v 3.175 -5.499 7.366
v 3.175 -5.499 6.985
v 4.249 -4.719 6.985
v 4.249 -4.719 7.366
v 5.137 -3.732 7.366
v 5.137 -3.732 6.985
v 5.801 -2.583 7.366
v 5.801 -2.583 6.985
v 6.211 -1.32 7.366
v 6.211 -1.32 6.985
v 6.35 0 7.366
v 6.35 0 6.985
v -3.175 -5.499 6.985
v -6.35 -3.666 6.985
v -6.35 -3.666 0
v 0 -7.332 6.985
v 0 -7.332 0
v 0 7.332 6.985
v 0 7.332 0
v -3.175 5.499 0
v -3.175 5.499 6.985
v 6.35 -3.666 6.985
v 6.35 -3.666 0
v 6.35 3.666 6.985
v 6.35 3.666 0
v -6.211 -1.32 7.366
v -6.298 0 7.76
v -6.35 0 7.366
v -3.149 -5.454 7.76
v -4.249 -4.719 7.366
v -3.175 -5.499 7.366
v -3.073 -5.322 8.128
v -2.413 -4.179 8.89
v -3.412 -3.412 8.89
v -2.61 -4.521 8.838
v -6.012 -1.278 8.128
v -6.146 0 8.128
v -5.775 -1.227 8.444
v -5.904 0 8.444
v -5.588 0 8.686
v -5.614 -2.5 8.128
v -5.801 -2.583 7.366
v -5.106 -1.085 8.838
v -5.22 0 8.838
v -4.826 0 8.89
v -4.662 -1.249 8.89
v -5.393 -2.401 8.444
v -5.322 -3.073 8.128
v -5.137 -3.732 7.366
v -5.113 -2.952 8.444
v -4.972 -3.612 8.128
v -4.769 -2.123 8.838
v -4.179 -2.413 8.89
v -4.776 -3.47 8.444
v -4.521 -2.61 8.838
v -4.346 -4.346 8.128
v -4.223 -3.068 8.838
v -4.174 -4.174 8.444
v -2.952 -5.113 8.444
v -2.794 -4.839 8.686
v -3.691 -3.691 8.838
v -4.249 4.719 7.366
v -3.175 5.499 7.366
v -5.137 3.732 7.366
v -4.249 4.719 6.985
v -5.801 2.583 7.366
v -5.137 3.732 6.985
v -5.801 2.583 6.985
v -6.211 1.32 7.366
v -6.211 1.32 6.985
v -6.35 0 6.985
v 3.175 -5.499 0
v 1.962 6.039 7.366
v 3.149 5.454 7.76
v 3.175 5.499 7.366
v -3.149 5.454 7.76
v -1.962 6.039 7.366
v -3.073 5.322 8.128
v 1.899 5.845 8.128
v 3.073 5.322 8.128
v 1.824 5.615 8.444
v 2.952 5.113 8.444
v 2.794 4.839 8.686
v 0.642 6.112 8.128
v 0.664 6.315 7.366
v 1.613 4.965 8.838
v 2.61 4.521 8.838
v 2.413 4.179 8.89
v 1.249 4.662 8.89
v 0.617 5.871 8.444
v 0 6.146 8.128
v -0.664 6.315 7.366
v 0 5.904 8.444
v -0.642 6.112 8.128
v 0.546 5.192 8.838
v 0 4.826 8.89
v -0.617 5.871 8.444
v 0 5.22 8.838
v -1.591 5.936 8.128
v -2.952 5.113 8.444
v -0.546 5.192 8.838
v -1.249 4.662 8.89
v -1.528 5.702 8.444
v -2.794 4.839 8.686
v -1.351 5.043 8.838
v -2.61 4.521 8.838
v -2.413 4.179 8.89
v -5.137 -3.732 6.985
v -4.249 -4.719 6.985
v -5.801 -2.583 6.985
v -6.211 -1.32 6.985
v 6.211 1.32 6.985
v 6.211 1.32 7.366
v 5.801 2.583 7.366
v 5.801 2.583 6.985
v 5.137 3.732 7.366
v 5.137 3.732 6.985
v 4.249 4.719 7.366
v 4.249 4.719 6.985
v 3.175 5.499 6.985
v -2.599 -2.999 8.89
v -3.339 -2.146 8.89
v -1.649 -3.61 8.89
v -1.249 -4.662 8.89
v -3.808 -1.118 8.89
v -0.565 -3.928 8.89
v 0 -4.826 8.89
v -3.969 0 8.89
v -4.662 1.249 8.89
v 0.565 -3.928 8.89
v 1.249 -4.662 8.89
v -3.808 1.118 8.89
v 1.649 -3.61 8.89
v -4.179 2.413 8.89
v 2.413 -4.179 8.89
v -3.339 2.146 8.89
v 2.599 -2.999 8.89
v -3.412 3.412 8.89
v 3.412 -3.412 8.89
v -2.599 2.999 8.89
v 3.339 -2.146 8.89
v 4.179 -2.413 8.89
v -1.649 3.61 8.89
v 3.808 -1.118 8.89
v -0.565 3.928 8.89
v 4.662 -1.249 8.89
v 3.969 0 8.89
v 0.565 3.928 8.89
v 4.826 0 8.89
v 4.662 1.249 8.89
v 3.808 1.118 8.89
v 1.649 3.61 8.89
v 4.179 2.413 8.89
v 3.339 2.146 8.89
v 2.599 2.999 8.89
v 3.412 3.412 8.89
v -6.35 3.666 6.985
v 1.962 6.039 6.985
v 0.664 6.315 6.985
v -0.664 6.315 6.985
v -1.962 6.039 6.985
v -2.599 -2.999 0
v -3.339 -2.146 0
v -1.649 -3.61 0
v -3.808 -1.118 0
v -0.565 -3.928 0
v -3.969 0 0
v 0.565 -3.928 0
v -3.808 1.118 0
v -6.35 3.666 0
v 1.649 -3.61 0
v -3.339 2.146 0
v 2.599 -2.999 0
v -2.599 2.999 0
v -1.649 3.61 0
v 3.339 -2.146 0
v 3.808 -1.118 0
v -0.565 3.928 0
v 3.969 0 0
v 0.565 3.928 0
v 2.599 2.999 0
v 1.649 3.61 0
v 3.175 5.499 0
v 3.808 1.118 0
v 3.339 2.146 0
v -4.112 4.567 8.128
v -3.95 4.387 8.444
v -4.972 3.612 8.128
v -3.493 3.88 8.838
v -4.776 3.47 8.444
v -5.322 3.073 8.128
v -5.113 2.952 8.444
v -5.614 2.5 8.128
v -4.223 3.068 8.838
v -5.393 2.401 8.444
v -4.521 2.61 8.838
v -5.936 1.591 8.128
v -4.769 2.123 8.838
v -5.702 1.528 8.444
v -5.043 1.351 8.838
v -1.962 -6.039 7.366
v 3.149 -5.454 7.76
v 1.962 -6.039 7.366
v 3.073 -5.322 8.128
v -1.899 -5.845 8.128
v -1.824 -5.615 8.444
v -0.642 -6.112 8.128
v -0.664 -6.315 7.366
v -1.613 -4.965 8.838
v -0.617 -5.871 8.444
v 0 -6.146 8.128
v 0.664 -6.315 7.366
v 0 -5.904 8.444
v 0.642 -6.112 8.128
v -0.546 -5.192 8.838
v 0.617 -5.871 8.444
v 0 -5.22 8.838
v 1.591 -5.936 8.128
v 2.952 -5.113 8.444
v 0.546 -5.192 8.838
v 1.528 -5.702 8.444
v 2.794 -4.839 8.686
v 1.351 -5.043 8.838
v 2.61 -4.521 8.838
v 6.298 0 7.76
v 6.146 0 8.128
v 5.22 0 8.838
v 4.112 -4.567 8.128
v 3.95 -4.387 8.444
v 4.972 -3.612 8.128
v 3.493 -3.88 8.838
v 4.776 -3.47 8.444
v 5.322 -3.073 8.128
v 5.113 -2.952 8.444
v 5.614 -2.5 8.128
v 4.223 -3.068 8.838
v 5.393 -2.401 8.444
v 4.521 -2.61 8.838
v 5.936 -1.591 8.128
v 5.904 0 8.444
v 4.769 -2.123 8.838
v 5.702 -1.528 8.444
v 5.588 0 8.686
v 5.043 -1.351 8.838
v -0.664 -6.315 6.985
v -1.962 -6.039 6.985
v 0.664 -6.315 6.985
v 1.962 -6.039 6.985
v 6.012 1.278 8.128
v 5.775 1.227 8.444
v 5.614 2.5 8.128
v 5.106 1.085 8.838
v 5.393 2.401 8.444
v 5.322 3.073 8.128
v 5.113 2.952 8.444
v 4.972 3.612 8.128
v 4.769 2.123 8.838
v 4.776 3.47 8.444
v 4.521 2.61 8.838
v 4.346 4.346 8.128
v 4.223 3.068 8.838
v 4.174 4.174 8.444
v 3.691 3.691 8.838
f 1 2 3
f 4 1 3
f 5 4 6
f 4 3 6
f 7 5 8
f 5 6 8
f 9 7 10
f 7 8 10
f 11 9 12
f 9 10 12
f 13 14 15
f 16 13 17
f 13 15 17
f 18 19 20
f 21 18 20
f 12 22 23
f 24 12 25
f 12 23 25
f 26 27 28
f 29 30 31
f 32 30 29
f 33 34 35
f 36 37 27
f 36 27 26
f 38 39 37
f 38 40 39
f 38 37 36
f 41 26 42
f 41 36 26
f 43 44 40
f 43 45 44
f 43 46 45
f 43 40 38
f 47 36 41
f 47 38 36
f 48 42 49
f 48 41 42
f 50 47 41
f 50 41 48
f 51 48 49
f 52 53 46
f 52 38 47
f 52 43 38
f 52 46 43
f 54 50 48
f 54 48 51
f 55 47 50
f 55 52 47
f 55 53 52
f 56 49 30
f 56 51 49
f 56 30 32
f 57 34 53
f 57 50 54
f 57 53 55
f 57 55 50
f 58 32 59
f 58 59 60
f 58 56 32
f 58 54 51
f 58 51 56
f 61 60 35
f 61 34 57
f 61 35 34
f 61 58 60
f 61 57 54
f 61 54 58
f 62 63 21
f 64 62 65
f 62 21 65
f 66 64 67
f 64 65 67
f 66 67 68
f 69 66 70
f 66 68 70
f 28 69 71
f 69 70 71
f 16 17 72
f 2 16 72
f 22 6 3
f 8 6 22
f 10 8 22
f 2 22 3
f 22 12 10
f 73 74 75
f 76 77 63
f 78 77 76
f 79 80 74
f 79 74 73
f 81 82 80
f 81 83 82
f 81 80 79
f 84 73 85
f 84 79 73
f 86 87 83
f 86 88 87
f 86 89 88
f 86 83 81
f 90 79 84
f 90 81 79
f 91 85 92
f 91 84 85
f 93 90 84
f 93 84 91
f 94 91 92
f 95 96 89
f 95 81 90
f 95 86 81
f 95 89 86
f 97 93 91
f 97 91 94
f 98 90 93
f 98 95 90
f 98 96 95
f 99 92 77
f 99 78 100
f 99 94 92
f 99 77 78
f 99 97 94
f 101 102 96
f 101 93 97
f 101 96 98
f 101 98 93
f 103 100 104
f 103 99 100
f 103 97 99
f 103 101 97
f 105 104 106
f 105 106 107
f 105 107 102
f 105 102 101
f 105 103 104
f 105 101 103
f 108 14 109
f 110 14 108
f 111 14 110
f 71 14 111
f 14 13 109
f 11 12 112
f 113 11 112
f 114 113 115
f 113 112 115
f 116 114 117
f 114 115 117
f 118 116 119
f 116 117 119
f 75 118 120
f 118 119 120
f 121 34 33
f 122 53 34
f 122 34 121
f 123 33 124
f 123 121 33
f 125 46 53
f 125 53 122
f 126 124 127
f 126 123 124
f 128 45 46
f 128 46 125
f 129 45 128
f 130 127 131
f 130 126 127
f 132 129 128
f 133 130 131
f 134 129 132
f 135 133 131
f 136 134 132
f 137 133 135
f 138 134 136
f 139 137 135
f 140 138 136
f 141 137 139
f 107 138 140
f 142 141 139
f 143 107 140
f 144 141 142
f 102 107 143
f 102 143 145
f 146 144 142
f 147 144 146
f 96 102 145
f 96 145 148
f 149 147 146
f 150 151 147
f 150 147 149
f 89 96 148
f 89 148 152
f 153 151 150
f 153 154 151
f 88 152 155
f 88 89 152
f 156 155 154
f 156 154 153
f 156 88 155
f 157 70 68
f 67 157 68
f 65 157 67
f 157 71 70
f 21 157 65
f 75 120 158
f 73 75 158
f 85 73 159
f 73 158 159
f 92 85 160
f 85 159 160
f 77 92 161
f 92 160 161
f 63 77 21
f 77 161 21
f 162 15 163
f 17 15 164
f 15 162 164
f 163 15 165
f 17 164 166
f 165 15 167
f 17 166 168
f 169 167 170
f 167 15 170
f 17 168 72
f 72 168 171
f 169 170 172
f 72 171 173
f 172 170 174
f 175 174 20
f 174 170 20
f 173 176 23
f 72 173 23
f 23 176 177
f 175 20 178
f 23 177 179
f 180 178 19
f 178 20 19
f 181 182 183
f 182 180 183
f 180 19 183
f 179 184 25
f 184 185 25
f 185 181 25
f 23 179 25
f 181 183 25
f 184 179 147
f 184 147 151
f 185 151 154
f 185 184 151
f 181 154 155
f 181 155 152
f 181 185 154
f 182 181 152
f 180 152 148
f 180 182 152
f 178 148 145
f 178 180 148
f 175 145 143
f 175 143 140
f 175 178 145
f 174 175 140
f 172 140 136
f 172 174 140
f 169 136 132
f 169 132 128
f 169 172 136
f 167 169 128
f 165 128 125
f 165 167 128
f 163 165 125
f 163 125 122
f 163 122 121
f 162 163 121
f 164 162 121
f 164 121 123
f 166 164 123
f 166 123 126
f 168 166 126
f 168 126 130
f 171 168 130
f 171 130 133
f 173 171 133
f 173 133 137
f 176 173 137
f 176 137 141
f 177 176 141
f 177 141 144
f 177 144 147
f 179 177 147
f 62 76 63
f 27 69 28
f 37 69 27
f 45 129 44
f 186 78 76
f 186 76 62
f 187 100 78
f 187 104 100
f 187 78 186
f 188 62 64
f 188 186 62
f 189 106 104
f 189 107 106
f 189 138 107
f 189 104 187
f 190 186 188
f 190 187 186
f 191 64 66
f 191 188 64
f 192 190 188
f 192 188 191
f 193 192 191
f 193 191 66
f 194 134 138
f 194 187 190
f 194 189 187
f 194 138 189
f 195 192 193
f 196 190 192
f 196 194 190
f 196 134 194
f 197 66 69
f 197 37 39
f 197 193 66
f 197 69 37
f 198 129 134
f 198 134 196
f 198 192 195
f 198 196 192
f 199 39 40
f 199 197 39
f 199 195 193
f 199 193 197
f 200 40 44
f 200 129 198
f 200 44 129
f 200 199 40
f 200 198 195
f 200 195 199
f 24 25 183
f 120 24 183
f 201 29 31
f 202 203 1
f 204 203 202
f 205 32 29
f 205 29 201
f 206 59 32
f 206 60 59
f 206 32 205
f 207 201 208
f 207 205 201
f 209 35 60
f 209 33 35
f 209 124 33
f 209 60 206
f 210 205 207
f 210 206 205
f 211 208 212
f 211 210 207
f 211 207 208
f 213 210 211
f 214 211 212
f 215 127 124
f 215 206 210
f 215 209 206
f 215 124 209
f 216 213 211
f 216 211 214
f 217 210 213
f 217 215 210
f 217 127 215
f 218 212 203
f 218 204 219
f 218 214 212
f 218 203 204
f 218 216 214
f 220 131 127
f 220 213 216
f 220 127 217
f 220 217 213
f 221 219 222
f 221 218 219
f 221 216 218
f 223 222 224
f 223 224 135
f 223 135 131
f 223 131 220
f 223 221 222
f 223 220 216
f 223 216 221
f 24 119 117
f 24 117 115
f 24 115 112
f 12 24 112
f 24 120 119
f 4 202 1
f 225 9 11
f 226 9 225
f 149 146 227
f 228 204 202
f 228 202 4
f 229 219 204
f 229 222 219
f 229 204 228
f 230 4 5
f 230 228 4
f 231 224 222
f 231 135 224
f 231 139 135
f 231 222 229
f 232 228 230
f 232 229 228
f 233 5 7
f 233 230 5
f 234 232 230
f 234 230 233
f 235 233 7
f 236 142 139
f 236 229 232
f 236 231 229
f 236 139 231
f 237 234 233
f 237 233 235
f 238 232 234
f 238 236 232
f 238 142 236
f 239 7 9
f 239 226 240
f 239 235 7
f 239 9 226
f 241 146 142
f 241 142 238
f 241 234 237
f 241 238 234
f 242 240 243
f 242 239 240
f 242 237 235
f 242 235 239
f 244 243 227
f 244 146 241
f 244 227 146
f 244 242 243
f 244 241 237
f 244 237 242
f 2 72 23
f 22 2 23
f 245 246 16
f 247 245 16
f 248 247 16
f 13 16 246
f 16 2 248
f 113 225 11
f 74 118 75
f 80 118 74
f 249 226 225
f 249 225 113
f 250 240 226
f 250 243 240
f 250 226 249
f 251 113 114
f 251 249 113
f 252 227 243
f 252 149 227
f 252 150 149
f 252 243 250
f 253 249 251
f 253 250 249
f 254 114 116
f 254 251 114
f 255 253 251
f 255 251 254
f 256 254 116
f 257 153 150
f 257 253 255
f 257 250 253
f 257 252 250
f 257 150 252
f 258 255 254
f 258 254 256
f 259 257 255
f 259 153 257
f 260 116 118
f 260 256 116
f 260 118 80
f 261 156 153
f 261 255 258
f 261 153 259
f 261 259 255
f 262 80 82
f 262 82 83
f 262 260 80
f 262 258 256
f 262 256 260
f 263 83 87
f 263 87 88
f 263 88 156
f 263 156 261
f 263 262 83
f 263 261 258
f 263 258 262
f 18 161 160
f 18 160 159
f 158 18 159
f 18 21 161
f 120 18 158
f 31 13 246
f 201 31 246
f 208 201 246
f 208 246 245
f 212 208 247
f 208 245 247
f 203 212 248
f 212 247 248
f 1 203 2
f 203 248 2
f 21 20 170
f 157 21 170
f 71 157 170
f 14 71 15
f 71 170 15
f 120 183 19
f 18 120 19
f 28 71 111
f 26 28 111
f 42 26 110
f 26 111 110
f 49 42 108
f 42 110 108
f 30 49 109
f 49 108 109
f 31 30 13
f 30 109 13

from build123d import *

# Parameters (mm, degrees)
F0_R     = 3.96875
F1_DEPTH = 6.985
F2_DEPTH = 8.89
F3_R     = 1.524


with BuildPart() as f1:
    # F0 (on Top) → F1 (new body)
    with BuildSketch(Plane.XY):
        with BuildLine():
            Line((-6.35, -3.6661742094), (-3.174999936, -5.499261351))
            ThreePointArc((-3.174999936, -5.499261351), (-5.4992612955, -3.175000032), (-6.35, 0))
            Line((-6.35, 0), (-6.35, -3.6661742094))
        make_face()
        with BuildLine():
            ThreePointArc((-6.35, 0), (-5.4992613406, 3.174999954), (-3.175000092, 5.4992612609))
            Line((-3.175000092, 5.4992612609), (-6.35, 3.6661742094))
            Line((-6.35, 3.6661742094), (-6.35, 0))
        make_face()
        with BuildLine():
            ThreePointArc((-3.175000092, 5.4992612609), (-1.72e-08, 6.35), (3.1750000622, 5.4992612781))
            Line((3.1750000622, 5.4992612781), (0, 7.3323484187))
            Line((0, 7.3323484187), (-3.175000092, 5.4992612609))
        make_face()
        with BuildLine():
            ThreePointArc((3.1750000622, 5.4992612781), (5.499261332, 3.1749999689), (6.35, 0))
            Line((6.35, 0), (6.35, 3.6661742094))
            Line((6.35, 3.6661742094), (3.1750000622, 5.4992612781))
        make_face()
        with BuildLine():
            Line((6.35, -3.6661742094), (6.35, 0))
            ThreePointArc((6.35, 0), (5.4992613128, -3.1750000022), (3.1749999956, -5.4992613166))
            Line((3.1749999956, -5.4992613166), (6.35, -3.6661742094))
        make_face()
        with BuildLine():
            Line((0, -7.3323484187), (3.1749999956, -5.4992613166))
            ThreePointArc((3.1749999956, -5.4992613166), (3.44e-08, -6.35), (-3.174999936, -5.499261351))
            Line((-3.174999936, -5.499261351), (0, -7.3323484187))
        make_face()
        with BuildLine():
            ThreePointArc((3.1749999956, -5.4992613166), (5.4992613128, -3.1750000022), (6.35, 0))
            ThreePointArc((6.35, 0), (5.499261332, 3.1749999689), (3.1750000622, 5.4992612781))
            ThreePointArc((3.1750000622, 5.4992612781), (-1.72e-08, 6.35), (-3.175000092, 5.4992612609))
            ThreePointArc((-3.175000092, 5.4992612609), (-5.4992613406, 3.174999954), (-6.35, 0))
            ThreePointArc((-6.35, 0), (-5.4992612955, -3.175000032), (-3.174999936, -5.499261351))
            ThreePointArc((-3.174999936, -5.499261351), (3.44e-08, -6.35), (3.1749999956, -5.4992613166))
        make_face()
        Circle(F0_R, mode=Mode.SUBTRACT)
    extrude(amount=F1_DEPTH)

    # F0 (on Top) → F2 (join)
    with BuildSketch(Plane.XY):
        with BuildLine():
            ThreePointArc((3.1749999956, -5.4992613166), (5.4992613128, -3.1750000022), (6.35, 0))
            ThreePointArc((6.35, 0), (5.499261332, 3.1749999689), (3.1750000622, 5.4992612781))
            ThreePointArc((3.1750000622, 5.4992612781), (-1.72e-08, 6.35), (-3.175000092, 5.4992612609))
            ThreePointArc((-3.175000092, 5.4992612609), (-5.4992613406, 3.174999954), (-6.35, 0))
            ThreePointArc((-6.35, 0), (-5.4992612955, -3.175000032), (-3.174999936, -5.499261351))
            ThreePointArc((-3.174999936, -5.499261351), (3.44e-08, -6.35), (3.1749999956, -5.4992613166))
        make_face()
        Circle(F0_R, mode=Mode.SUBTRACT)
    extrude(amount=F2_DEPTH)

    # F3
    f3_edges = [f1.edges().sort_by_distance(p)[0] for p in [
        (3.175, -5.499261, 8.89),
    ]]
    fillet(f3_edges, radius=F3_R)


solid = f1.part
